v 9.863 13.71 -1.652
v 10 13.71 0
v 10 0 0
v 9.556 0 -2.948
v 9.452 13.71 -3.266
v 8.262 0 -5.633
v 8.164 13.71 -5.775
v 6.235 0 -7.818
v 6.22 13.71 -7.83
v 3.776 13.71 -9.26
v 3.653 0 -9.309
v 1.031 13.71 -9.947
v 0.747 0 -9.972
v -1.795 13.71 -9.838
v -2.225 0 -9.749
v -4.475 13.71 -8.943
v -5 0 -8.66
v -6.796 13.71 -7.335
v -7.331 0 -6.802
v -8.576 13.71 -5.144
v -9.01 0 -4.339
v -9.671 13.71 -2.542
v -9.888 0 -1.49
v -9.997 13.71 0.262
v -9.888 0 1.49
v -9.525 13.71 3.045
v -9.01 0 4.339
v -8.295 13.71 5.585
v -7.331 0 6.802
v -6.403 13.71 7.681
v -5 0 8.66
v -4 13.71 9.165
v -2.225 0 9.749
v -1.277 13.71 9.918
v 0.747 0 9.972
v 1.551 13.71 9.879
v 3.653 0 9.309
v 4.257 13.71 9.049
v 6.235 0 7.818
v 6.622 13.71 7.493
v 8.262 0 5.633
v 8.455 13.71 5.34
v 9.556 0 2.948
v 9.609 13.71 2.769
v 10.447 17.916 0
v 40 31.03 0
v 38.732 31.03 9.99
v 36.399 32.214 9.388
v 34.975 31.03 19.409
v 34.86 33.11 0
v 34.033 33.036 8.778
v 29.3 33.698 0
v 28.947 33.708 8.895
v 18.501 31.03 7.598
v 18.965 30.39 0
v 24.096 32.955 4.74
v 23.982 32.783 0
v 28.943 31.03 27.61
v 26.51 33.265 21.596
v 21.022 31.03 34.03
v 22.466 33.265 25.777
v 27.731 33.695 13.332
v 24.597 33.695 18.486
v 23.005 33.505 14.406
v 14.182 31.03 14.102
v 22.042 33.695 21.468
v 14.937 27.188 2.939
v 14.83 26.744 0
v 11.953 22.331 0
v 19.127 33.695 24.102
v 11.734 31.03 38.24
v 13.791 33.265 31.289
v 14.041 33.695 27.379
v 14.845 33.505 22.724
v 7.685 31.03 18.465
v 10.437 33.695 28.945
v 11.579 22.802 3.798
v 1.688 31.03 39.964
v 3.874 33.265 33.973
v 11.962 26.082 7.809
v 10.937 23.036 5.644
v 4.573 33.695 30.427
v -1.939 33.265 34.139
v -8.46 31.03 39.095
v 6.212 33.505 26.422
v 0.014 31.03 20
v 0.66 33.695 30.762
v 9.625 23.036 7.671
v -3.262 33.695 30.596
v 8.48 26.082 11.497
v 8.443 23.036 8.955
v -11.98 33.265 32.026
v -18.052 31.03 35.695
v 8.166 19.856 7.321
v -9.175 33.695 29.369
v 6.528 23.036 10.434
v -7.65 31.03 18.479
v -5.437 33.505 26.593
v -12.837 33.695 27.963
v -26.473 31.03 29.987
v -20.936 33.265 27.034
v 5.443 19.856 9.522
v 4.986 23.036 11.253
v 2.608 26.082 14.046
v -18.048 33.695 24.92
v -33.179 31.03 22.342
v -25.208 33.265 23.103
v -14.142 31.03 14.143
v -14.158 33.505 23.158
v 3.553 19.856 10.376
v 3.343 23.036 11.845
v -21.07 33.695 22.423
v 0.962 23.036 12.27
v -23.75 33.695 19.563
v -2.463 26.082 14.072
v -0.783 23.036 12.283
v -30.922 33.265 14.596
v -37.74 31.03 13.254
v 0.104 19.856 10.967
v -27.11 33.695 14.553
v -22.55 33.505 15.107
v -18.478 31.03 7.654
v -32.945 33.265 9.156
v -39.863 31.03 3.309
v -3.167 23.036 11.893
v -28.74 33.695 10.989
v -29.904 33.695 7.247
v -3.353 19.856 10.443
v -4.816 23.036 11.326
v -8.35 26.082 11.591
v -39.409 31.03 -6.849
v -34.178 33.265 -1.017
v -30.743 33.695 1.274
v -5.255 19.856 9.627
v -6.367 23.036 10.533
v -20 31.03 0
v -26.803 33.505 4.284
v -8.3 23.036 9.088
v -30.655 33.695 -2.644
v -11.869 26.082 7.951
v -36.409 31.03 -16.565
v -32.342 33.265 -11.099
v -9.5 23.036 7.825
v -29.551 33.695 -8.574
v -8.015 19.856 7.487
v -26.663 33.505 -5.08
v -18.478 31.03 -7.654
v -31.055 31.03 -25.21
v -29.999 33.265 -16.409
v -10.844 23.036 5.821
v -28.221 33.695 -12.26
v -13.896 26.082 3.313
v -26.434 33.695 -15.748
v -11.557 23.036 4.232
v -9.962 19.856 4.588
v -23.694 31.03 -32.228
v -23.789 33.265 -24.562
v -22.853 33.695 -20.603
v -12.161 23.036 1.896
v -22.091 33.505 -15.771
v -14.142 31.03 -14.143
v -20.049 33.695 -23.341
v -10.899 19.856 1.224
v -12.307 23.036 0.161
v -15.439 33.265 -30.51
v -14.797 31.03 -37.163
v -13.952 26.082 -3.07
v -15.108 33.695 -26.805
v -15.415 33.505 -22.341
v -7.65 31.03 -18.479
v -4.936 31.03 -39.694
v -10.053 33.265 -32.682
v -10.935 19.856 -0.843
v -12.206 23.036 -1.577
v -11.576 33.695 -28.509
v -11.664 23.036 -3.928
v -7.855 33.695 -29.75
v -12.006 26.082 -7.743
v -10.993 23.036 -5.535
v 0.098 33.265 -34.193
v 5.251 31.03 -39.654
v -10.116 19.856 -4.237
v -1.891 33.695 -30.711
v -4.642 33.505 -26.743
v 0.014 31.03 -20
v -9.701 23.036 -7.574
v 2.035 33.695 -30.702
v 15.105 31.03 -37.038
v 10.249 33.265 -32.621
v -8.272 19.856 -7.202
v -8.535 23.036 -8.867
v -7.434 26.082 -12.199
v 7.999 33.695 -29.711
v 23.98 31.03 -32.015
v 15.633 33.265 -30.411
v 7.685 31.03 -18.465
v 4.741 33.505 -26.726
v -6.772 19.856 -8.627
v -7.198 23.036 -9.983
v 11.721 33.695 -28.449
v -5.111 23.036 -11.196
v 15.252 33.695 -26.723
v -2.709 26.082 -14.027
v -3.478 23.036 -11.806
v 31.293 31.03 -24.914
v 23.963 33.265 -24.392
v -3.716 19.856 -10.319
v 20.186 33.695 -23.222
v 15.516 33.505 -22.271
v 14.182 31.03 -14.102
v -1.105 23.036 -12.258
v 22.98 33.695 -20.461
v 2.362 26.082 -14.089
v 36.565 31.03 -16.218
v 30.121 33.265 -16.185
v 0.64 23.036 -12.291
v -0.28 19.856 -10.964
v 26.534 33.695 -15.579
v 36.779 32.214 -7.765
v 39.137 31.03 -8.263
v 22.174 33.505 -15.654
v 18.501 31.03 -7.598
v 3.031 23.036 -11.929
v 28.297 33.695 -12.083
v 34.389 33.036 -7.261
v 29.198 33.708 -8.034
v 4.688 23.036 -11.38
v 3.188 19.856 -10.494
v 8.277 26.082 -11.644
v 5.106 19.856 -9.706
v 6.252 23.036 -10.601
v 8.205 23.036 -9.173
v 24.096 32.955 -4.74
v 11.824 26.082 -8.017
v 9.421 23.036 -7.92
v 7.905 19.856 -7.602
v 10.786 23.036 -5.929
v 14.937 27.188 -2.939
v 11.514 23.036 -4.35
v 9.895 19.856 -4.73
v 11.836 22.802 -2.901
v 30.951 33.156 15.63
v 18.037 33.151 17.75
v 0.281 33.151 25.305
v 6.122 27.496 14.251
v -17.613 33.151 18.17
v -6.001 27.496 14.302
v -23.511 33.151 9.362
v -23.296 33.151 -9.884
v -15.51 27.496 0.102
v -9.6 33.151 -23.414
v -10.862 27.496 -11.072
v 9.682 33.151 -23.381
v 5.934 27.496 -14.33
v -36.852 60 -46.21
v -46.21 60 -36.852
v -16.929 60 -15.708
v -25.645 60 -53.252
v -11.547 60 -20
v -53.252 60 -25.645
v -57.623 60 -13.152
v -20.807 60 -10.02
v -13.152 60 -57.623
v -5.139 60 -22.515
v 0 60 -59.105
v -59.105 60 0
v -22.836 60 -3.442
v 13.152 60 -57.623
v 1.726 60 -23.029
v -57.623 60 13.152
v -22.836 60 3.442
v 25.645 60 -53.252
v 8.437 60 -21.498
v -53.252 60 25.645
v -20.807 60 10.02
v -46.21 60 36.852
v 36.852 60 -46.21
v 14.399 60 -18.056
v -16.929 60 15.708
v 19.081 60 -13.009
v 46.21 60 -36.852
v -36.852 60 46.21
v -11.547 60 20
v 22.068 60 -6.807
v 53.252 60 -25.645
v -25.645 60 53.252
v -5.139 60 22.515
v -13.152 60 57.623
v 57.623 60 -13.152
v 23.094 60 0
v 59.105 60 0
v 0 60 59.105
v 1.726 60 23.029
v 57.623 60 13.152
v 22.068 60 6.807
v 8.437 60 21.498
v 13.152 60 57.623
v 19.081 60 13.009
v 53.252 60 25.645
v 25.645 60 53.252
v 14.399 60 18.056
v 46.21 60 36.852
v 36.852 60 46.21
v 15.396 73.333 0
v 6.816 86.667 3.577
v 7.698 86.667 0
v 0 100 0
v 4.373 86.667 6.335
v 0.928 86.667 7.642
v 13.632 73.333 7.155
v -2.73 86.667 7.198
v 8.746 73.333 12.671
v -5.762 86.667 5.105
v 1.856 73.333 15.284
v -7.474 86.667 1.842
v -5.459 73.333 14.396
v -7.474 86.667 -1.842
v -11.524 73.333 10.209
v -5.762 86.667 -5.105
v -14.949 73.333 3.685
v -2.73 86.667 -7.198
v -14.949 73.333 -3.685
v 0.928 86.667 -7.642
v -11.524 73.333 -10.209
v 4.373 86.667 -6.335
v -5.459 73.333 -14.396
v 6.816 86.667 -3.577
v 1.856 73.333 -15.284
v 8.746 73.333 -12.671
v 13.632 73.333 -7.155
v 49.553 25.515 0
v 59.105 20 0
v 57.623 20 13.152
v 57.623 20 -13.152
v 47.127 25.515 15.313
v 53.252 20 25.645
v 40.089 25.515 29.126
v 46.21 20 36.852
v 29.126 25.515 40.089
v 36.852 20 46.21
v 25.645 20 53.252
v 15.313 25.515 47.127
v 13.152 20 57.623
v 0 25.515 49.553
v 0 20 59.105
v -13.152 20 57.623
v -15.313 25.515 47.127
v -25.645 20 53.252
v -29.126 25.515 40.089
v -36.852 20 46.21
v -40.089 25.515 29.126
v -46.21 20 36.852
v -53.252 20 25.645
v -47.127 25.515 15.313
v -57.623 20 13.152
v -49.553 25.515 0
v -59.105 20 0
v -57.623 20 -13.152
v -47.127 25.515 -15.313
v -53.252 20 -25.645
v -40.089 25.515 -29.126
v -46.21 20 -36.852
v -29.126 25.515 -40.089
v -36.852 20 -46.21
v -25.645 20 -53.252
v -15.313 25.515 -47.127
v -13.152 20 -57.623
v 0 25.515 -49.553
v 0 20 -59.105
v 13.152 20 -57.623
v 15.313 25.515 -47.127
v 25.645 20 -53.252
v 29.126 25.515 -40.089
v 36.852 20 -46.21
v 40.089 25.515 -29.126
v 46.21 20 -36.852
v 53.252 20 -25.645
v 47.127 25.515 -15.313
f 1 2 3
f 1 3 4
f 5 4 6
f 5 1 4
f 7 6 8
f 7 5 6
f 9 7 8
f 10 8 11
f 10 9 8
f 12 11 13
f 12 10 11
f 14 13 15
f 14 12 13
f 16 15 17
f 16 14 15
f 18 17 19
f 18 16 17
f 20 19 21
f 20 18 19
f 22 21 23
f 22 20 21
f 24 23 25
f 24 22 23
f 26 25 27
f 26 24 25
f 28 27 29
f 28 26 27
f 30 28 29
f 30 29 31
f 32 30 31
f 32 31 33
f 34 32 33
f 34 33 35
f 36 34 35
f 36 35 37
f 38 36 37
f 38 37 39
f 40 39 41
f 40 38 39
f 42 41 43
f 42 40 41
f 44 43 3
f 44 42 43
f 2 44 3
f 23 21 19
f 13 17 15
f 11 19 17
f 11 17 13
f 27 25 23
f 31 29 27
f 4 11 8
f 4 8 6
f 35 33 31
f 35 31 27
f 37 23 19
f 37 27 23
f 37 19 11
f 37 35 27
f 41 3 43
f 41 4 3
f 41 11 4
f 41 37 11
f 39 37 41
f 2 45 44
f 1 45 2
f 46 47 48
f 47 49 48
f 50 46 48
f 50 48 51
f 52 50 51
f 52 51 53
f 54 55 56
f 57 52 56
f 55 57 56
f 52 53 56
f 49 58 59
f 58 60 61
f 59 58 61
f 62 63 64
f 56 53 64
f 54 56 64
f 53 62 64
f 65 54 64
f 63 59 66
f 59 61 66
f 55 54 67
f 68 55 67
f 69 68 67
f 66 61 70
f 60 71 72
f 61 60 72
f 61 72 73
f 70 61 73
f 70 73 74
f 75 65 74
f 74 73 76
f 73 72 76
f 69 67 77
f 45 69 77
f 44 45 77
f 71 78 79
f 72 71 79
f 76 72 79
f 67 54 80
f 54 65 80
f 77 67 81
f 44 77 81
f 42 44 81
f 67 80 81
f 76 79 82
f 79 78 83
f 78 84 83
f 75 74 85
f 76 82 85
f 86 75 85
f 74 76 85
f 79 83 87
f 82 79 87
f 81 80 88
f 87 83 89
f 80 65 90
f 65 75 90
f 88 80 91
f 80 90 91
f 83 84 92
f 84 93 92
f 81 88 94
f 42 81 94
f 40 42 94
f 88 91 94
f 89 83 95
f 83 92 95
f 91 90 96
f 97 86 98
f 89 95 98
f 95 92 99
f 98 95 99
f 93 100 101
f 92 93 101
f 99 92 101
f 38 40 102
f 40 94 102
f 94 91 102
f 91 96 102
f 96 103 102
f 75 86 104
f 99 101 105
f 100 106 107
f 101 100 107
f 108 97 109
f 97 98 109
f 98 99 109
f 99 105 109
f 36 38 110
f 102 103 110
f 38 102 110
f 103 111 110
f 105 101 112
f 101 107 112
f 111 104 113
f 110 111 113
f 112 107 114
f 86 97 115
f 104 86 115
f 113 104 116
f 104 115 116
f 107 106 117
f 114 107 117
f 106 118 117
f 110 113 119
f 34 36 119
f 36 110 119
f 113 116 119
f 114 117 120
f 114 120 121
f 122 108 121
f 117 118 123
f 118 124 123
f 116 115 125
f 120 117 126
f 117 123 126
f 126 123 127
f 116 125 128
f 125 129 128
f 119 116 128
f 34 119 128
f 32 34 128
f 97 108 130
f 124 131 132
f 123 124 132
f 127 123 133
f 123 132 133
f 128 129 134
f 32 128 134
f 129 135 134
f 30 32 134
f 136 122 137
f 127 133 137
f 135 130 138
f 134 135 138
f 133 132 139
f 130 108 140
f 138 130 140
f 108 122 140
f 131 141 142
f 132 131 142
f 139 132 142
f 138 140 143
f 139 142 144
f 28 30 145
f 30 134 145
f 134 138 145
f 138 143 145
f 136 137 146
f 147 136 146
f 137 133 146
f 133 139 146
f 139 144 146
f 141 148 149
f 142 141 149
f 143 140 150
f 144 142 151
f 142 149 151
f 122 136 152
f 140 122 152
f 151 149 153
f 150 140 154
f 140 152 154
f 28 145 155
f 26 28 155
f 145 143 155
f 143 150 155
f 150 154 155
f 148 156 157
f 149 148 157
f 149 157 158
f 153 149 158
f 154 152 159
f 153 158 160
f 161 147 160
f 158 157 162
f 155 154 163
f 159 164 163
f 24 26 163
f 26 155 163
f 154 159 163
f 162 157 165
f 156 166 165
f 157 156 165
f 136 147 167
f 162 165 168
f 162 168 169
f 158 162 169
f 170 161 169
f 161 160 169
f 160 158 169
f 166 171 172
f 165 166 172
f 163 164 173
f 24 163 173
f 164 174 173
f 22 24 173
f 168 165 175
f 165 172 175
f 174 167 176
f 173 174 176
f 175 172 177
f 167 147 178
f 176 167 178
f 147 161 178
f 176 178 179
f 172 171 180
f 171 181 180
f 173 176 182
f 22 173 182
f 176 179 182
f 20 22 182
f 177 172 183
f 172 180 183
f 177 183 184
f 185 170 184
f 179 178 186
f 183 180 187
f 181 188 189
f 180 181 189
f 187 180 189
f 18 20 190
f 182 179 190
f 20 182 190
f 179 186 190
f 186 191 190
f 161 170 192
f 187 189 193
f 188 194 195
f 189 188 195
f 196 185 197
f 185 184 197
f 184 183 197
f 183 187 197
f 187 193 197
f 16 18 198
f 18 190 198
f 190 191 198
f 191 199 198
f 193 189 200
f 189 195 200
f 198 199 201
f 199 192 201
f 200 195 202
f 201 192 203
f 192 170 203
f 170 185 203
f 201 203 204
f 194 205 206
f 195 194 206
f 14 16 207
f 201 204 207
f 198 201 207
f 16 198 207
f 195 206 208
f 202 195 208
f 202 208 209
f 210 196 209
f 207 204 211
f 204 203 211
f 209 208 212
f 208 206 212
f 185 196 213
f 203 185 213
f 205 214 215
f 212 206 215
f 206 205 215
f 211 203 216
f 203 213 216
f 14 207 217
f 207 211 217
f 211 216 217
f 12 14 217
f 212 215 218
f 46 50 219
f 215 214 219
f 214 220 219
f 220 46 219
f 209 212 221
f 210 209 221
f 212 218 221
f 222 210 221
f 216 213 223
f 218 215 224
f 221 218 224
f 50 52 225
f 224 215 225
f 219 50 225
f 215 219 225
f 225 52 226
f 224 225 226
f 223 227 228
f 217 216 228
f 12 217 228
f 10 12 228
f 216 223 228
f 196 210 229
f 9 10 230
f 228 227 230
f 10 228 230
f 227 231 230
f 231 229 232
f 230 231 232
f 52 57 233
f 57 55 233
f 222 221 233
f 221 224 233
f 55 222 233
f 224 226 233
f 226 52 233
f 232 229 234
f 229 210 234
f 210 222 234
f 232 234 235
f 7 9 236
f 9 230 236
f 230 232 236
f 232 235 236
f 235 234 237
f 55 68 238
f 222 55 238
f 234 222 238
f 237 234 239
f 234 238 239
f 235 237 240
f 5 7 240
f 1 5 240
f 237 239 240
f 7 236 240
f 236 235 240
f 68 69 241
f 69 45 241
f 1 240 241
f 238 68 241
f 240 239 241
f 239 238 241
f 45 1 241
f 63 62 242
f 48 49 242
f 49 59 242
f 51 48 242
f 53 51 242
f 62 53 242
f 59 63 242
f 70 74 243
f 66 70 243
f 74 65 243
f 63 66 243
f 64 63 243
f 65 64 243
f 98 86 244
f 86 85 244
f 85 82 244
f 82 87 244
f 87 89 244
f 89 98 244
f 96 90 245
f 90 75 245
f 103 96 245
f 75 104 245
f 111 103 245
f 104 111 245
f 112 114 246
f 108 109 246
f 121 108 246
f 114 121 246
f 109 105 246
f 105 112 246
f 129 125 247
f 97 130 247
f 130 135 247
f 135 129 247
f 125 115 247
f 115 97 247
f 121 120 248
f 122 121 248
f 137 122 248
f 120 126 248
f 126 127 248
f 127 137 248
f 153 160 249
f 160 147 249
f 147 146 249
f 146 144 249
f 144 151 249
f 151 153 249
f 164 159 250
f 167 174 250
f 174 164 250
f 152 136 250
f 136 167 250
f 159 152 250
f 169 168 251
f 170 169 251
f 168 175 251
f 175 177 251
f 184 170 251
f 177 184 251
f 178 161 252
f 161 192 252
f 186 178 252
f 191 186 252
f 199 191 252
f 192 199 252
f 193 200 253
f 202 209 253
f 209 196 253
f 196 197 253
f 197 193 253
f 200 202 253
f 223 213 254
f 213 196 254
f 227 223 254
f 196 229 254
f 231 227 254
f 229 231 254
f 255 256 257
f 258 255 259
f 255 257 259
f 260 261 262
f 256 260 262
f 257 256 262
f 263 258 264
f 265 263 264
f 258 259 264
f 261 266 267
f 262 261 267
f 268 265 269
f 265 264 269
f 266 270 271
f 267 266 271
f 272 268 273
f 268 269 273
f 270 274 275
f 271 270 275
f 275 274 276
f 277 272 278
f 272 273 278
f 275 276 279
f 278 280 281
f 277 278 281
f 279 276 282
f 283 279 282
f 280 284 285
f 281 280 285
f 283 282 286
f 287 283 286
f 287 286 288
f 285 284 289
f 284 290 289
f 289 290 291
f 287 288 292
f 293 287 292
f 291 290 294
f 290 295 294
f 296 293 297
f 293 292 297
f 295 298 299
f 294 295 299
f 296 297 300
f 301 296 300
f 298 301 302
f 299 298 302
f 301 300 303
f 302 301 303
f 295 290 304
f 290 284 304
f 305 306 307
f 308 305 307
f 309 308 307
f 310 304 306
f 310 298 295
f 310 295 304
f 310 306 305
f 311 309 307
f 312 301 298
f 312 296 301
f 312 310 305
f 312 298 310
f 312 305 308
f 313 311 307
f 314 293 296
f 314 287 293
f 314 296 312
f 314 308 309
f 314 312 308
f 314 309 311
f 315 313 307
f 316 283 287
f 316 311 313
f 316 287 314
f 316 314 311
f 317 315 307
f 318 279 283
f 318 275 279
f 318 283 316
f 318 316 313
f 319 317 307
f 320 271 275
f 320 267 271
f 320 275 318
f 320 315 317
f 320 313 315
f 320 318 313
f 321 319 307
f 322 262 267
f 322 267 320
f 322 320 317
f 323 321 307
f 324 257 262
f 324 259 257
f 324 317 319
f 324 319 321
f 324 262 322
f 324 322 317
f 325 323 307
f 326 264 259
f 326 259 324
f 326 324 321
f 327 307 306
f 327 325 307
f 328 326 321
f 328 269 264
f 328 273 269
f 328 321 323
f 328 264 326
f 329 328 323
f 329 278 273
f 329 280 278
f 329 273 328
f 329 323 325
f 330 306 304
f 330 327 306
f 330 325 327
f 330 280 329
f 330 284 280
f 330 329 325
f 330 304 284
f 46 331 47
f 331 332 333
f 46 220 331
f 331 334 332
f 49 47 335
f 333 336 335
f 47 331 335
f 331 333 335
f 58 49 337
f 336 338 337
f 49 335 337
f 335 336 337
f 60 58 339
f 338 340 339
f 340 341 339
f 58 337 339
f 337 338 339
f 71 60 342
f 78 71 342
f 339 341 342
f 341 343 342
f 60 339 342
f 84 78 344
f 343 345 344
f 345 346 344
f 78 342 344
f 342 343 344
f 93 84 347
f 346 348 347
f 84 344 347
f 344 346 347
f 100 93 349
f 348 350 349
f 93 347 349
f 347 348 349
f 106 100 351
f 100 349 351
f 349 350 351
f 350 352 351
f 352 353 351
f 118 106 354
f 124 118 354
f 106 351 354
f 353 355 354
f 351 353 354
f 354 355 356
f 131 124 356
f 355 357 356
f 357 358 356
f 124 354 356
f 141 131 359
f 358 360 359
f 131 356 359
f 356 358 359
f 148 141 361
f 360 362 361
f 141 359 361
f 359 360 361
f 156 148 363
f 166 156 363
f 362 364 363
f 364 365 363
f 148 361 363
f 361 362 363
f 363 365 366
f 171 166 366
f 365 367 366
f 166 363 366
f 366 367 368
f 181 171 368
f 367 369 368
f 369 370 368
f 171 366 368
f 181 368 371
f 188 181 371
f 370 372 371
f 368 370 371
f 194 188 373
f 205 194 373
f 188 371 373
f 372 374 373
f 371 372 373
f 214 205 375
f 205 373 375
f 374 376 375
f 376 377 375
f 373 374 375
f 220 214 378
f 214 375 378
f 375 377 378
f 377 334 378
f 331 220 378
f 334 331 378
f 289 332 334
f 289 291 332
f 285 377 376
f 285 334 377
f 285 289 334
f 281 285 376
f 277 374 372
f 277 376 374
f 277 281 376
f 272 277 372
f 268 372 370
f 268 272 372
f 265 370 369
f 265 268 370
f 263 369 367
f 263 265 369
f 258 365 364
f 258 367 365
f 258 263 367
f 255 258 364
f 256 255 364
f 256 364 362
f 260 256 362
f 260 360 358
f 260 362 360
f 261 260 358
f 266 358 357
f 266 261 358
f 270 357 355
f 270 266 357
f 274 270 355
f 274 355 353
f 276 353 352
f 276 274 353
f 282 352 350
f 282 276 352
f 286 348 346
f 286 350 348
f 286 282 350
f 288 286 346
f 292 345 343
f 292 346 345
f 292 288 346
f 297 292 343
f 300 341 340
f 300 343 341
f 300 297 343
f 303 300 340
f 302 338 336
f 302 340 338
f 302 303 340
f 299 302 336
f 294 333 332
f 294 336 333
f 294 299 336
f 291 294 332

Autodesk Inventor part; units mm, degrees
ref_plane "YZ Plane" through (0, 0, 0) normal (1, 0, 0) x (0, 1, 0)
ref_plane "XZ Plane" through (0, 0, 0) normal (0, 1, 0) x (-1, 0, 0)
ref_plane "XY Plane" through (0, 0, 0) normal (0, 0, 1) x (1, 0, 0)
sketch "Sketch1" plane through (0, 0, 0) normal (0, 0, 1) x (1, 0, 0)
  line L0 (0, 0) -> (10, 0)
  line L1 (10, 0) -> (10, 48.3509)
  line L2 (10, 48.3509) -> (59.1053, 20)
  line L3 (59.1053, 20) -> (59.1053, 60)
  line L4 (59.1053, 60) -> (23.094, 60)
  line L5 (23.094, 60) -> (0, 100)
  line L6 (0, 100) -> (0, 0)
  dimension "d0" = 20
  dimension "d1" = 30
  dimension "d2" = 100
  dimension "d3" = 60
  dimension "d4" = 40
  dimension "d5" = 118.2105
  dimension "d6" = 60
revolve "Revolution1" add sketch "Sketch1" angle 360 about axis through (0, 100, 0) along (0, -1, 0)
fillet "Fillet1" radius 20 1 edges at (-10, 48.3509, 0)
equation "\"ITERACOES\" = 0"
equation "\"VALORES_OTIMOS\" = 118.21054"
properties part number "Mass_otimization" material "Steel, Mild"
